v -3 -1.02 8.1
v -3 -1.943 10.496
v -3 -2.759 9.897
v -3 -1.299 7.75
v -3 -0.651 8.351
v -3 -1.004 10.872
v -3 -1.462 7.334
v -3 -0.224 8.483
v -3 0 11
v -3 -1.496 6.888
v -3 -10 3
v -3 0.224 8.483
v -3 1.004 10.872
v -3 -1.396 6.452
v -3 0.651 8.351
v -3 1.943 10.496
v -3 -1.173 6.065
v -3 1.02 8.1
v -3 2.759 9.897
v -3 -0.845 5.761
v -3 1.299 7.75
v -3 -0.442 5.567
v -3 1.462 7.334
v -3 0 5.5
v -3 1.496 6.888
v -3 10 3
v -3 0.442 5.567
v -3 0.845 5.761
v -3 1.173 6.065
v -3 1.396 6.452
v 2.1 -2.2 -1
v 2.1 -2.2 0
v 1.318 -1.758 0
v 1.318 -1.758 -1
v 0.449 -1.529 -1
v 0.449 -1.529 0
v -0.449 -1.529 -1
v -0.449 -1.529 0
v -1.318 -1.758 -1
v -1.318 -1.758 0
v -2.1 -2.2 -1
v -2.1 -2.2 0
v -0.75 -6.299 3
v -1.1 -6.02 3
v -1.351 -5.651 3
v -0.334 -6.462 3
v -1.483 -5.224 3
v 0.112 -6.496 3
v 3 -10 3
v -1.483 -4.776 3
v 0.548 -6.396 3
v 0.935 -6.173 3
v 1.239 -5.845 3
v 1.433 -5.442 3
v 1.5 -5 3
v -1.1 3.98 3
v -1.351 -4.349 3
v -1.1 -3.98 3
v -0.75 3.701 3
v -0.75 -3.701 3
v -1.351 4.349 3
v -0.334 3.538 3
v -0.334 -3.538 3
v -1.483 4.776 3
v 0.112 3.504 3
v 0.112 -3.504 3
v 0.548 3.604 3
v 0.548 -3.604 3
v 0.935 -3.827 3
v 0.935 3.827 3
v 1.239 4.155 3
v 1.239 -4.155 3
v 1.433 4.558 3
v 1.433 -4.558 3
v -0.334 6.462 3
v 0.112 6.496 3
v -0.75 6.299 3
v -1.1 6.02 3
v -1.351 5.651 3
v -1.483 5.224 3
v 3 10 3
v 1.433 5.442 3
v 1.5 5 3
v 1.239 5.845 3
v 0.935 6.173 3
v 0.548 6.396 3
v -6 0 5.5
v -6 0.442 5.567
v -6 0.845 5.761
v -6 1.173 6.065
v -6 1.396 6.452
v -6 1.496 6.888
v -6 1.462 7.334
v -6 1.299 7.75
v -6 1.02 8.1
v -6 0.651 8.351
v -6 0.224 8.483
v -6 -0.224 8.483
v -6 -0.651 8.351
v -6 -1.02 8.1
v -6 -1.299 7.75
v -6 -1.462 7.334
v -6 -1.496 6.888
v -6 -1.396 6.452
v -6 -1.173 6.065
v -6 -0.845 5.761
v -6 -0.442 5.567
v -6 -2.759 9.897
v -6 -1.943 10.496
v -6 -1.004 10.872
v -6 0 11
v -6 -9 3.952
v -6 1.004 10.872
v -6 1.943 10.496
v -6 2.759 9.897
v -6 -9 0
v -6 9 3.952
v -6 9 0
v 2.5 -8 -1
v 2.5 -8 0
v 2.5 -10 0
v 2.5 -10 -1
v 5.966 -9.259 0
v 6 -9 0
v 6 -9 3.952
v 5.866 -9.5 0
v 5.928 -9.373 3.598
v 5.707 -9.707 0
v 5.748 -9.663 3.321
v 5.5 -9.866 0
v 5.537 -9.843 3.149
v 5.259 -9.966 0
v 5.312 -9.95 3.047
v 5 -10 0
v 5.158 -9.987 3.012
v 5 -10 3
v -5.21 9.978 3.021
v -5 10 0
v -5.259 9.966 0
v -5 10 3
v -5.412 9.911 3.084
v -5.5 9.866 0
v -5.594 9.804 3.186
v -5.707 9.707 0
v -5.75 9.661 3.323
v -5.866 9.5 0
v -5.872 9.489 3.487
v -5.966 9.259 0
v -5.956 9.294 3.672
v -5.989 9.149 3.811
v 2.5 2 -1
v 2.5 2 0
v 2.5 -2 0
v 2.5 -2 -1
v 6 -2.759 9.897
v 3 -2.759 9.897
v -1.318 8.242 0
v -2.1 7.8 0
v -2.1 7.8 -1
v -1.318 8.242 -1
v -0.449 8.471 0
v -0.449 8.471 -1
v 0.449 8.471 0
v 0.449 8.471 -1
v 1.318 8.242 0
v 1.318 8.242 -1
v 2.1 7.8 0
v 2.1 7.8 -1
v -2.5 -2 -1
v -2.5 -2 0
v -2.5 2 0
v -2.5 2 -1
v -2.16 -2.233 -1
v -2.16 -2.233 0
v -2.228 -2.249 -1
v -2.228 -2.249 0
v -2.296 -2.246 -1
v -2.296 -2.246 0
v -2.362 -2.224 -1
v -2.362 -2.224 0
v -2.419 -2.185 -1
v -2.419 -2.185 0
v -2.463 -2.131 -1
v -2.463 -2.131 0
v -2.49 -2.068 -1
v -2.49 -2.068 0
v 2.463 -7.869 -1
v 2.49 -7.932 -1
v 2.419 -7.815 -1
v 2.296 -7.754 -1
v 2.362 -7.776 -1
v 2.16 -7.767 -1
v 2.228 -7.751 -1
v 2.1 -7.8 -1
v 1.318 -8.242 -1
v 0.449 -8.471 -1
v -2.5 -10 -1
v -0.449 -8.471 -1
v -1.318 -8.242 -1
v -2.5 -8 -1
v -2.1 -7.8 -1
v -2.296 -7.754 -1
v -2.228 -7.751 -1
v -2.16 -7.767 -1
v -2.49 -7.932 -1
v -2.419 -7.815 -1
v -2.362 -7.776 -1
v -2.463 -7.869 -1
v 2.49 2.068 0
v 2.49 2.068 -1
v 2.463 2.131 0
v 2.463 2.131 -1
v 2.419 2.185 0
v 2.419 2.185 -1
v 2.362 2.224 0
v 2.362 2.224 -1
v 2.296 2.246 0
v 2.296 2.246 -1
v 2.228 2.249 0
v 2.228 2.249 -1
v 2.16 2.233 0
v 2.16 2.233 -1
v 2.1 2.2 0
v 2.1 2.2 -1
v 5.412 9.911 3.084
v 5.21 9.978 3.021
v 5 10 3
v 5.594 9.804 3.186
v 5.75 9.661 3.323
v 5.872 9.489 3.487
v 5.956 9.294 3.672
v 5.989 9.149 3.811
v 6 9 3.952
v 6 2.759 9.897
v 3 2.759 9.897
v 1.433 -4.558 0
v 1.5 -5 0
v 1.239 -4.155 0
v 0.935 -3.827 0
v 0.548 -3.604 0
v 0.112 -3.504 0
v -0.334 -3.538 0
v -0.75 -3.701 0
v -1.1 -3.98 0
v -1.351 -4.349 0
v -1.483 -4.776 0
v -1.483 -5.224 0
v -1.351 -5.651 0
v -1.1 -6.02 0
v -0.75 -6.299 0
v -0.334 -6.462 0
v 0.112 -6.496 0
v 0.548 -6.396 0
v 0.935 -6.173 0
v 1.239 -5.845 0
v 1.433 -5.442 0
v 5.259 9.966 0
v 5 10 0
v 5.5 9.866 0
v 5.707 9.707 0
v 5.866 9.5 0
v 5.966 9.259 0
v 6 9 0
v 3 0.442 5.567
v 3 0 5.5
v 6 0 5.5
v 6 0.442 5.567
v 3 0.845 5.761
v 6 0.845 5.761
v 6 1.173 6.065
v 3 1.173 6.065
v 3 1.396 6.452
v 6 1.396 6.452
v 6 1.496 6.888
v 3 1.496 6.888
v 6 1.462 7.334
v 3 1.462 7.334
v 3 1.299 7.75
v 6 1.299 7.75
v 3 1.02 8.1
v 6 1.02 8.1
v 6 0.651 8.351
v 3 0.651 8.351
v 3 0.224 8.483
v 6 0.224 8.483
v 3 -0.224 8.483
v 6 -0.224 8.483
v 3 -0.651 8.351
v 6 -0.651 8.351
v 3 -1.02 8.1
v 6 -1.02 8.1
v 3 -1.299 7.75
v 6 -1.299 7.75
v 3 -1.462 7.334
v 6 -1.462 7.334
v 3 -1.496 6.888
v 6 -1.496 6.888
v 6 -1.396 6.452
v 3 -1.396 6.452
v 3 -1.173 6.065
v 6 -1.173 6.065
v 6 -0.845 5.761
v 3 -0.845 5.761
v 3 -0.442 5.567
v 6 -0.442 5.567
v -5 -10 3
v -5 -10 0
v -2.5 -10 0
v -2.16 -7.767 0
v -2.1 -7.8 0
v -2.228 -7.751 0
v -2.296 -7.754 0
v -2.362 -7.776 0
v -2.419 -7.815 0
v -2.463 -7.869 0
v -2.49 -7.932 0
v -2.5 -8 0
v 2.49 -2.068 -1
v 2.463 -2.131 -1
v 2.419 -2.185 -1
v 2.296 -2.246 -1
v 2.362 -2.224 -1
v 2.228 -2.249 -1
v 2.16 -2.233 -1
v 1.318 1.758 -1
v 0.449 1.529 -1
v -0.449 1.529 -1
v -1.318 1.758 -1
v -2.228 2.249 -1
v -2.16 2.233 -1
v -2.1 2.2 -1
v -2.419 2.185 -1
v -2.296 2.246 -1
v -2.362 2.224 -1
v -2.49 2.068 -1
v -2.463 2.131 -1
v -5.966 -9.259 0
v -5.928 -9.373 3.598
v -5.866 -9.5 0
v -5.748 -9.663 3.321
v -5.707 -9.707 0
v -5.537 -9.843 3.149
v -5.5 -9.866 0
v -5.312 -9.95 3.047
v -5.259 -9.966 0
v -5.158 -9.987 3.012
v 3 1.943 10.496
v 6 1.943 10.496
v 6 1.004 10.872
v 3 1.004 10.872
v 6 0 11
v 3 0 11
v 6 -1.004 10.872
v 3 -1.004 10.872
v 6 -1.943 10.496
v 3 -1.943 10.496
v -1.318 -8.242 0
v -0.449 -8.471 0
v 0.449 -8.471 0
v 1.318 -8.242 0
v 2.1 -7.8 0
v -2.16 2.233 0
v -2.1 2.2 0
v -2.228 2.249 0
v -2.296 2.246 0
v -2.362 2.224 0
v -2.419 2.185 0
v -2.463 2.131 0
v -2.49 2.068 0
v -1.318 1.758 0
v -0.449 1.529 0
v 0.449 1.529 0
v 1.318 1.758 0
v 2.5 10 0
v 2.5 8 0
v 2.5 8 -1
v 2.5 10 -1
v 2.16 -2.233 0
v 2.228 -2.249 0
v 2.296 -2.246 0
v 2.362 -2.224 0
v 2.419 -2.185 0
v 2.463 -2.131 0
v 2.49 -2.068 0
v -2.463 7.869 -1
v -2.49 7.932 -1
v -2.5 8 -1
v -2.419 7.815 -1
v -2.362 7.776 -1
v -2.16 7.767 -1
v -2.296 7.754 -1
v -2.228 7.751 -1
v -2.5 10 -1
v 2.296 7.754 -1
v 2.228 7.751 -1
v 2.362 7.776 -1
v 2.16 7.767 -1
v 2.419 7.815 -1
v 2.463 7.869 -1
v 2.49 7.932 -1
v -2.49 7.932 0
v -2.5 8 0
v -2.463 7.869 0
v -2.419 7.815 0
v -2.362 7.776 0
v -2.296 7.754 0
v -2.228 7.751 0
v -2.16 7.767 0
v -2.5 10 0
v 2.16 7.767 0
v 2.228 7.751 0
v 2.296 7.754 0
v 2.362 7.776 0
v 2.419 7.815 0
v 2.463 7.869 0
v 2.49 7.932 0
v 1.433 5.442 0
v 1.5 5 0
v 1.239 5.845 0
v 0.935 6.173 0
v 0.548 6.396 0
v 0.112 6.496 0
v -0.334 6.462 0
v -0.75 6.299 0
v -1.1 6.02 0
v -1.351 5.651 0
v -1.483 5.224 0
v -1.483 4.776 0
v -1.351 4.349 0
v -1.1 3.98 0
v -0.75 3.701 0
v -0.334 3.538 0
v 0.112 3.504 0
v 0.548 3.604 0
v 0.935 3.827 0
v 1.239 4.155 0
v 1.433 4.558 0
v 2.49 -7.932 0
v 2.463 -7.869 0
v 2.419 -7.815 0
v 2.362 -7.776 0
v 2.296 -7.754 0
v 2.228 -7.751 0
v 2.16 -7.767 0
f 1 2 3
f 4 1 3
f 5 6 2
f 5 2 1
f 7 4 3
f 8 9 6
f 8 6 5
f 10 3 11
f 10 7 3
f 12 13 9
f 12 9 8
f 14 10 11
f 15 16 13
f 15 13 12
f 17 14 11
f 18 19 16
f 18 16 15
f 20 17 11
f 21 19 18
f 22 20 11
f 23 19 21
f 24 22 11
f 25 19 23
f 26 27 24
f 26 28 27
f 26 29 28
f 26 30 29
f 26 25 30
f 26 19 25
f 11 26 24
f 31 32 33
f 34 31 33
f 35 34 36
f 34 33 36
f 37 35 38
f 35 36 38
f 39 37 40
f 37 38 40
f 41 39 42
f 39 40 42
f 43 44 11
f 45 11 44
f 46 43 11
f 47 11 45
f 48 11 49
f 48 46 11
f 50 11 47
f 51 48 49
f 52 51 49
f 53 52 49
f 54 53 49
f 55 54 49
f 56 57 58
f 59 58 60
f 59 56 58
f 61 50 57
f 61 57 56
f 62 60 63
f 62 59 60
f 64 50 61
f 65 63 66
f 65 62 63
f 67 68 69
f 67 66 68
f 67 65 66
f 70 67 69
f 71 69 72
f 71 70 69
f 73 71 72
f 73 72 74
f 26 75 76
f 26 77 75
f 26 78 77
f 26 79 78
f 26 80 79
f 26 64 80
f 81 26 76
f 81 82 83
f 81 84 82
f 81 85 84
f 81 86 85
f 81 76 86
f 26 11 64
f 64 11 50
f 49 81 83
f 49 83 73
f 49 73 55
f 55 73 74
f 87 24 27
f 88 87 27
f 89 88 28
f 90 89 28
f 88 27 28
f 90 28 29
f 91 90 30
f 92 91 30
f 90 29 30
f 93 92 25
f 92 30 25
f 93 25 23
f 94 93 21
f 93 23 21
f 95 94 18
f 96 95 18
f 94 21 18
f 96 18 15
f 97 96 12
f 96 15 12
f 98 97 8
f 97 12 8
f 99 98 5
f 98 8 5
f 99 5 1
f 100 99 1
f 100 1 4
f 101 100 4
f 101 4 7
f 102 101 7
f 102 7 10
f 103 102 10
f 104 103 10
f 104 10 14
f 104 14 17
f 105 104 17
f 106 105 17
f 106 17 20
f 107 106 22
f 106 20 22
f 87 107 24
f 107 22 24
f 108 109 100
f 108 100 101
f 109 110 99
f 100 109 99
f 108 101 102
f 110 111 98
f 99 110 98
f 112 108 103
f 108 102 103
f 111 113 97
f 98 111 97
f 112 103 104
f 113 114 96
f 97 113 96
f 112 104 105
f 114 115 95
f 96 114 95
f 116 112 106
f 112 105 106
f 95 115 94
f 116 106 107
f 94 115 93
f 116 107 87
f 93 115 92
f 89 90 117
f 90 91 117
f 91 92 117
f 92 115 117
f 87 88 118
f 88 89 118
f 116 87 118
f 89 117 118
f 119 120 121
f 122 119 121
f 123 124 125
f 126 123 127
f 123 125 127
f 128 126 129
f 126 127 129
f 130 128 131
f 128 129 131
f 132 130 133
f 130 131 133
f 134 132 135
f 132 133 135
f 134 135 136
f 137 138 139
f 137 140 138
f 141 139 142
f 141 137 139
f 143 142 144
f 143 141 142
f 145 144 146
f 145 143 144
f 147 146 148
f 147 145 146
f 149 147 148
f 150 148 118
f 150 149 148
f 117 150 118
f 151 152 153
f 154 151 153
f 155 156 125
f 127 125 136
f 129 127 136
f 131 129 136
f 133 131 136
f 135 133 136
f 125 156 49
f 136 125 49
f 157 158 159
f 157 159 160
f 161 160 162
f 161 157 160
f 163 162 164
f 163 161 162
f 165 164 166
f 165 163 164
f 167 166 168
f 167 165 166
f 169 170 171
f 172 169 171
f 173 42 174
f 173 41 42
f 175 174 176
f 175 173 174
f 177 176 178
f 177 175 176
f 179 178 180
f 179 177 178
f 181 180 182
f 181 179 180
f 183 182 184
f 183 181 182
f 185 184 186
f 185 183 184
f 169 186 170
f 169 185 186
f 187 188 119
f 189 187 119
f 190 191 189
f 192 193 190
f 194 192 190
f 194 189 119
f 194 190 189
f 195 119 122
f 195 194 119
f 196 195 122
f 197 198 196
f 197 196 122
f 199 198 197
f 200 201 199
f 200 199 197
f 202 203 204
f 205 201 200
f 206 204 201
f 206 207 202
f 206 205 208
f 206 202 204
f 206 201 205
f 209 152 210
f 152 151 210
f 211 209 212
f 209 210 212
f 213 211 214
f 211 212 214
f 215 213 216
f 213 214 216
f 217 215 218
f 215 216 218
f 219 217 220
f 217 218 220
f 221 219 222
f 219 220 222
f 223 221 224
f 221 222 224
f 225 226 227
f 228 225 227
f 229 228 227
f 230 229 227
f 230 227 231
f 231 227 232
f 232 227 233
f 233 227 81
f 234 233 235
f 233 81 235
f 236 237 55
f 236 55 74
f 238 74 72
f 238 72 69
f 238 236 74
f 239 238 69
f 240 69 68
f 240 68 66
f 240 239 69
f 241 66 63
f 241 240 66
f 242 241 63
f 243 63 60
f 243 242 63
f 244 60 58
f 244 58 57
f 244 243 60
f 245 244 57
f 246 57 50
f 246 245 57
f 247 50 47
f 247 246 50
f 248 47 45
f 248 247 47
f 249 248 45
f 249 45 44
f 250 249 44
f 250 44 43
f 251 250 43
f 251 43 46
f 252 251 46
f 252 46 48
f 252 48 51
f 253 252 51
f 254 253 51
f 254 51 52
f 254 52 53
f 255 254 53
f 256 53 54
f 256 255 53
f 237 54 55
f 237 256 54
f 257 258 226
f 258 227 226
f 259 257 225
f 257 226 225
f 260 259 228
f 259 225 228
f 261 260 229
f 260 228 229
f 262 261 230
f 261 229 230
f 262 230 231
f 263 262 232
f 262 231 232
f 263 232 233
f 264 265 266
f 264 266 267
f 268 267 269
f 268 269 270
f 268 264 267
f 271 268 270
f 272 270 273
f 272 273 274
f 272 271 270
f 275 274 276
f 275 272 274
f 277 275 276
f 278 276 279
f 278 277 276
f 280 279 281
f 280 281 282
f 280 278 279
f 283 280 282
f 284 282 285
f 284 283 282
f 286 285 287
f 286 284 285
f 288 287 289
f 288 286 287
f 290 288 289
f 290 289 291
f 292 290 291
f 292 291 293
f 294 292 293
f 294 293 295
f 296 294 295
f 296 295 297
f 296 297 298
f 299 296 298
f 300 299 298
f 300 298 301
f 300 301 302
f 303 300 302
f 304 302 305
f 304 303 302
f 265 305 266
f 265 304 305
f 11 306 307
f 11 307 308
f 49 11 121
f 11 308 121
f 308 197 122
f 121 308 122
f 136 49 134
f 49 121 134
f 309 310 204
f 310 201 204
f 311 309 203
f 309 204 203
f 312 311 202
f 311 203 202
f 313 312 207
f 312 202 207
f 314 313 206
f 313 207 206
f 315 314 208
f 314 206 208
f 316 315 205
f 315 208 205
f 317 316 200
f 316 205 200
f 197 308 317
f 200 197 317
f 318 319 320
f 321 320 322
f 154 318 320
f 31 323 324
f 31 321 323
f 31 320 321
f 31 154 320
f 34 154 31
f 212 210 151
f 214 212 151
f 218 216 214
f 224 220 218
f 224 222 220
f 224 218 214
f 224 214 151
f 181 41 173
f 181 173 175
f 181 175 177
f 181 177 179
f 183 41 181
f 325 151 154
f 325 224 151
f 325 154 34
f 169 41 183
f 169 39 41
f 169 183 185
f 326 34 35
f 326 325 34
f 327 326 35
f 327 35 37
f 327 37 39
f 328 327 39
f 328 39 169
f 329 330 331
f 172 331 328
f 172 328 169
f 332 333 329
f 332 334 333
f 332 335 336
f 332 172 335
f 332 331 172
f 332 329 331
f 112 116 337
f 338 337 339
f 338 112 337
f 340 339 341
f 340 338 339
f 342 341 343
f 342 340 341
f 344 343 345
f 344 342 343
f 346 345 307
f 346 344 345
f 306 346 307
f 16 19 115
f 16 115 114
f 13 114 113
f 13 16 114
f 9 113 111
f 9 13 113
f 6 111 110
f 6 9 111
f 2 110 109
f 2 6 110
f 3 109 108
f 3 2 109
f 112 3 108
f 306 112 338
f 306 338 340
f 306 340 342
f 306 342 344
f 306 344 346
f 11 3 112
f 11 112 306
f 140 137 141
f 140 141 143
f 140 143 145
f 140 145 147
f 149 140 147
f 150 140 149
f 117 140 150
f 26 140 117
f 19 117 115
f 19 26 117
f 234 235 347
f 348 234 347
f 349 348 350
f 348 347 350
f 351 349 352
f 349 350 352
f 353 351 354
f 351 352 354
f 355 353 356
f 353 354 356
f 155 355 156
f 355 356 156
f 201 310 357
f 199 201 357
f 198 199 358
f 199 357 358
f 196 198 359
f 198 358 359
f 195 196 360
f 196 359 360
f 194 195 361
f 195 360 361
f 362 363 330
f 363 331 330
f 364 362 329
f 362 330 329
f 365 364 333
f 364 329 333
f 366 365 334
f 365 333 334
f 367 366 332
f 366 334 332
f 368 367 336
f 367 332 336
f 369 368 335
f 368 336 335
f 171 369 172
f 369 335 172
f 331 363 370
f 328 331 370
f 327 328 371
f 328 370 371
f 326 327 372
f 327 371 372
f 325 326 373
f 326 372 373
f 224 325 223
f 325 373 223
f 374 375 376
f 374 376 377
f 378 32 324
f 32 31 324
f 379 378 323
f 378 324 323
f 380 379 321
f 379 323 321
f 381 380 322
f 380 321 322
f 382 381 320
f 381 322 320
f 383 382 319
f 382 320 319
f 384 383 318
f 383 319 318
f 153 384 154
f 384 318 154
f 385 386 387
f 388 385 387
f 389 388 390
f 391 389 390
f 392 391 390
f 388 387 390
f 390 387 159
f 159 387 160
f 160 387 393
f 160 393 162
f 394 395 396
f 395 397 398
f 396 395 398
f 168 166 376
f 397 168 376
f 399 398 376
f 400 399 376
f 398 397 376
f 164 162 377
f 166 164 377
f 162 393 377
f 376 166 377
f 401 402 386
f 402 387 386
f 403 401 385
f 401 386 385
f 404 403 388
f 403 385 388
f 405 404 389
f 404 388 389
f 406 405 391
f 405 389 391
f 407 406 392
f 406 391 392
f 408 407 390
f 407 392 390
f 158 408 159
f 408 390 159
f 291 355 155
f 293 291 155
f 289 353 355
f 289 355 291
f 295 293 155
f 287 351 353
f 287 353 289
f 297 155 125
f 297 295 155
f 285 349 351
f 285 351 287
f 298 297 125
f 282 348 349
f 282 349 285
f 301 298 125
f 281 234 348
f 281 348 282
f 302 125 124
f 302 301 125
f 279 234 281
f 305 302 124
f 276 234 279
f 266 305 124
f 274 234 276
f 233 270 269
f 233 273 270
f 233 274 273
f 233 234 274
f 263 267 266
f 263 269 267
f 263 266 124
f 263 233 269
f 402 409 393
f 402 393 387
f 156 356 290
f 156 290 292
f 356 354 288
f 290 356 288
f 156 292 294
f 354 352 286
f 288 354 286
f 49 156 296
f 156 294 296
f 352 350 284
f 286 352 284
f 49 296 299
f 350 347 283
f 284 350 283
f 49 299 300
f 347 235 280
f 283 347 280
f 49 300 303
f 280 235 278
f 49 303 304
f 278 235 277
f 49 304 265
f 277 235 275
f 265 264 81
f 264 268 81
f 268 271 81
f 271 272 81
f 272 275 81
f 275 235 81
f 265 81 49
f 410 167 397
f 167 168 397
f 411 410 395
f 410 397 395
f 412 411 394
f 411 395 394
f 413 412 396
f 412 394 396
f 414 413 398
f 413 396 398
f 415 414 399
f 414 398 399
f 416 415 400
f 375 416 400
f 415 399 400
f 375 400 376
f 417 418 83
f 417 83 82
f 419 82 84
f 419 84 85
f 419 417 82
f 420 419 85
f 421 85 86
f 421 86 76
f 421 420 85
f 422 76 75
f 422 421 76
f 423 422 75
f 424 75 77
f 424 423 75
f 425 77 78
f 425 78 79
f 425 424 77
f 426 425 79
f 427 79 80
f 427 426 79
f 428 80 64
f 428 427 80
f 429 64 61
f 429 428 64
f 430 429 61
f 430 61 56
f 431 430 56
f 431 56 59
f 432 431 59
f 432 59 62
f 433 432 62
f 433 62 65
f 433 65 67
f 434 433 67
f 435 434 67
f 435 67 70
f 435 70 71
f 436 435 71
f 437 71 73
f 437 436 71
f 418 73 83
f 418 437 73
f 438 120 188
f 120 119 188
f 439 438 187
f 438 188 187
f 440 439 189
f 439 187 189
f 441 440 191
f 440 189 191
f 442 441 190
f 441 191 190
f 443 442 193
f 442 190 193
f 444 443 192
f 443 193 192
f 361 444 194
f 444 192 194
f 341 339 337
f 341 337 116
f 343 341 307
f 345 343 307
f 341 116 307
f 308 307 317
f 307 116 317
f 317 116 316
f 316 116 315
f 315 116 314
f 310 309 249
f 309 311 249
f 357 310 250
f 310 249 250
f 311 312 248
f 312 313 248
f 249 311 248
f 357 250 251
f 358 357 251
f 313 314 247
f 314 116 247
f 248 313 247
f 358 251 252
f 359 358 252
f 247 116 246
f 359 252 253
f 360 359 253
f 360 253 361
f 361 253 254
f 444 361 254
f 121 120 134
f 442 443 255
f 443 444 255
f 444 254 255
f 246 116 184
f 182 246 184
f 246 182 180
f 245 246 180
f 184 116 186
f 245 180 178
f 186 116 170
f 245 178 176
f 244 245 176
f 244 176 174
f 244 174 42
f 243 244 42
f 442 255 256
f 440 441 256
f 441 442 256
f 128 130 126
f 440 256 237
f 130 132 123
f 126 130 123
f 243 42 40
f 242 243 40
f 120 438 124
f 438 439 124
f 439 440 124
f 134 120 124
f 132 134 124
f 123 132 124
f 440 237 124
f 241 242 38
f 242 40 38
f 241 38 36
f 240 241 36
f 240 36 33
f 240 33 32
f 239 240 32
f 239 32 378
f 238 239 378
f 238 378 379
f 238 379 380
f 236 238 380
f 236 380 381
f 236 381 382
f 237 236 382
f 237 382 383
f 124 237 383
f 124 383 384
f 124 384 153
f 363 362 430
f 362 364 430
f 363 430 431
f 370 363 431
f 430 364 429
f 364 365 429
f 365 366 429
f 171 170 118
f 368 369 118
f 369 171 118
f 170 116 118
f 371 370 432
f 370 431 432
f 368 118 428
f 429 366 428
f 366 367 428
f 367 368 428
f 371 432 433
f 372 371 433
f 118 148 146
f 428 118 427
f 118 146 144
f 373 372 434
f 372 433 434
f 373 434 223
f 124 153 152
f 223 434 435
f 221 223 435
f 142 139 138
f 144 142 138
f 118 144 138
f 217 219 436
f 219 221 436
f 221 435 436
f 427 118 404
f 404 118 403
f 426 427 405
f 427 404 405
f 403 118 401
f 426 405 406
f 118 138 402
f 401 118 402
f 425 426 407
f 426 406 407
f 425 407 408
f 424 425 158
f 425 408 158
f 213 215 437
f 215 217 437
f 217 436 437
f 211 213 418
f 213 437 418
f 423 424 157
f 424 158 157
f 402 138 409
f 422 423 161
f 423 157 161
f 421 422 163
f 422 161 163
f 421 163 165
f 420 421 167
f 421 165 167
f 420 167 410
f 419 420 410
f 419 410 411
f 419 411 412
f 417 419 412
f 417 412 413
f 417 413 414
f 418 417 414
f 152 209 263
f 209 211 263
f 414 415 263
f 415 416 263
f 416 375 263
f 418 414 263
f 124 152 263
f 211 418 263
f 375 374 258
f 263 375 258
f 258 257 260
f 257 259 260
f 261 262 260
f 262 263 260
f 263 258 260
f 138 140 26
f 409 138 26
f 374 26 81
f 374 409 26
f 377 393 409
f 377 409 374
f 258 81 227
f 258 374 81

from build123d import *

# Parameters (mm, degrees)
SKETCH1_W           = 12
SKETCH1_H           = 20
SKETCH1_R           = 1.5
BOSS_EXTRUDE1_DEPTH = 3
BOSS_EXTRUDE2_DEPTH = 1
FILLET1_R           = 0.25
BOSS_EXTRUDE3_START = 3
SKETCH4_R           = 1.5
BOSS_EXTRUDE3_DEPTH = 3
FILLET2_R           = 1


with BuildPart() as part:
    # Sketch1 → Boss-Extrude1 (new body)
    with BuildSketch(Plane.XY):
        Rectangle(SKETCH1_W, SKETCH1_H)
        with Locations((0, 5)):
            Circle(SKETCH1_R, mode=Mode.SUBTRACT)
        with Locations((0, -5)):
            Circle(SKETCH1_R, mode=Mode.SUBTRACT)
    extrude(amount=BOSS_EXTRUDE1_DEPTH)

    # Sketch3 → Boss-Extrude2 (add)
    with BuildSketch(Plane(origin=(0, 0, 0), x_dir=(-1, 0, 0), z_dir=(0, 0, -1))):
        with BuildLine():
            Line((-2.5, -10), (2.5, -10))
            Line((2.5, -10), (2.5, -7.449489743))
            ThreePointArc((2.5, -7.449489743), (0, -8.5), (-2.5, -7.449489743))
            Line((-2.5, -7.449489743), (-2.5, -10))
        make_face()
        with BuildLine():
            Line((-2.5, 10), (2.5, 10))
            Line((2.5, 10), (2.5, 7.449489743))
            ThreePointArc((2.5, 7.449489743), (0, 8.5), (-2.5, 7.449489743))
            Line((-2.5, 7.449489743), (-2.5, 10))
        make_face()
        with BuildLine():
            Line((2.5, -2.550510257), (2.5, 2.550510257))
            ThreePointArc((2.5, 2.550510257), (0, 1.5), (-2.5, 2.550510257))
            Line((-2.5, 2.550510257), (-2.5, -2.550510257))
            ThreePointArc((-2.5, -2.550510257), (0, -1.5), (2.5, -2.550510257))
        make_face()
    extrude(amount=BOSS_EXTRUDE2_DEPTH)

    # Fillet1
    fillet1_edges = [part.edges().sort_by_distance(p)[0] for p in [
        (2.5, -7.449489743, -0.5),
        (-2.5, -7.449489743, -0.5),
        (-2.5, 7.449489743, -0.5),
        (2.5, 7.449489743, -0.5),
        (-2.5, 2.550510257, -0.5),
        (2.5, 2.550510257, -0.5),
        (2.5, -2.550510257, -0.5),
        (-2.5, -2.550510257, -0.5),
    ]]
    fillet(fillet1_edges, radius=FILLET1_R)

    # Sketch4 → Boss-Extrude3 (add)
    with BuildSketch(Plane(origin=(0, 0, 0), x_dir=(0, 0, -1), z_dir=(1, 0, 0)).offset(BOSS_EXTRUDE3_START)):
        with BuildLine():
            Line((-3, 10), (-9.896551724, 2.75862069))
            ThreePointArc((-9.896551724, 2.75862069), (-11, 0), (-9.896551724, -2.75862069))
            Line((-9.896551724, -2.75862069), (-3, -10))
            Line((-3, -10), (-3, 10))
        make_face()
        with Locations((-7, 0)):
            Circle(SKETCH4_R, mode=Mode.SUBTRACT)
    boss_extrude3 = extrude(amount=BOSS_EXTRUDE3_DEPTH)

    # Mirror2: Boss-Extrude3 across plane
    add(boss_extrude3.mirror(Plane(origin=(0, 0, 0), x_dir=(0, 0, 1), z_dir=(1, 0, 0))))

    # Fillet2
    fillet2_edges = [part.edges().sort_by_distance(p)[0] for p in [
        (6, -10, 1.5),
        (-6, -10, 1.5),
        (-6, 10, 1.5),
        (6, 10, 1.5),
    ]]
    fillet(fillet2_edges, radius=FILLET2_R)


solid = part.part
